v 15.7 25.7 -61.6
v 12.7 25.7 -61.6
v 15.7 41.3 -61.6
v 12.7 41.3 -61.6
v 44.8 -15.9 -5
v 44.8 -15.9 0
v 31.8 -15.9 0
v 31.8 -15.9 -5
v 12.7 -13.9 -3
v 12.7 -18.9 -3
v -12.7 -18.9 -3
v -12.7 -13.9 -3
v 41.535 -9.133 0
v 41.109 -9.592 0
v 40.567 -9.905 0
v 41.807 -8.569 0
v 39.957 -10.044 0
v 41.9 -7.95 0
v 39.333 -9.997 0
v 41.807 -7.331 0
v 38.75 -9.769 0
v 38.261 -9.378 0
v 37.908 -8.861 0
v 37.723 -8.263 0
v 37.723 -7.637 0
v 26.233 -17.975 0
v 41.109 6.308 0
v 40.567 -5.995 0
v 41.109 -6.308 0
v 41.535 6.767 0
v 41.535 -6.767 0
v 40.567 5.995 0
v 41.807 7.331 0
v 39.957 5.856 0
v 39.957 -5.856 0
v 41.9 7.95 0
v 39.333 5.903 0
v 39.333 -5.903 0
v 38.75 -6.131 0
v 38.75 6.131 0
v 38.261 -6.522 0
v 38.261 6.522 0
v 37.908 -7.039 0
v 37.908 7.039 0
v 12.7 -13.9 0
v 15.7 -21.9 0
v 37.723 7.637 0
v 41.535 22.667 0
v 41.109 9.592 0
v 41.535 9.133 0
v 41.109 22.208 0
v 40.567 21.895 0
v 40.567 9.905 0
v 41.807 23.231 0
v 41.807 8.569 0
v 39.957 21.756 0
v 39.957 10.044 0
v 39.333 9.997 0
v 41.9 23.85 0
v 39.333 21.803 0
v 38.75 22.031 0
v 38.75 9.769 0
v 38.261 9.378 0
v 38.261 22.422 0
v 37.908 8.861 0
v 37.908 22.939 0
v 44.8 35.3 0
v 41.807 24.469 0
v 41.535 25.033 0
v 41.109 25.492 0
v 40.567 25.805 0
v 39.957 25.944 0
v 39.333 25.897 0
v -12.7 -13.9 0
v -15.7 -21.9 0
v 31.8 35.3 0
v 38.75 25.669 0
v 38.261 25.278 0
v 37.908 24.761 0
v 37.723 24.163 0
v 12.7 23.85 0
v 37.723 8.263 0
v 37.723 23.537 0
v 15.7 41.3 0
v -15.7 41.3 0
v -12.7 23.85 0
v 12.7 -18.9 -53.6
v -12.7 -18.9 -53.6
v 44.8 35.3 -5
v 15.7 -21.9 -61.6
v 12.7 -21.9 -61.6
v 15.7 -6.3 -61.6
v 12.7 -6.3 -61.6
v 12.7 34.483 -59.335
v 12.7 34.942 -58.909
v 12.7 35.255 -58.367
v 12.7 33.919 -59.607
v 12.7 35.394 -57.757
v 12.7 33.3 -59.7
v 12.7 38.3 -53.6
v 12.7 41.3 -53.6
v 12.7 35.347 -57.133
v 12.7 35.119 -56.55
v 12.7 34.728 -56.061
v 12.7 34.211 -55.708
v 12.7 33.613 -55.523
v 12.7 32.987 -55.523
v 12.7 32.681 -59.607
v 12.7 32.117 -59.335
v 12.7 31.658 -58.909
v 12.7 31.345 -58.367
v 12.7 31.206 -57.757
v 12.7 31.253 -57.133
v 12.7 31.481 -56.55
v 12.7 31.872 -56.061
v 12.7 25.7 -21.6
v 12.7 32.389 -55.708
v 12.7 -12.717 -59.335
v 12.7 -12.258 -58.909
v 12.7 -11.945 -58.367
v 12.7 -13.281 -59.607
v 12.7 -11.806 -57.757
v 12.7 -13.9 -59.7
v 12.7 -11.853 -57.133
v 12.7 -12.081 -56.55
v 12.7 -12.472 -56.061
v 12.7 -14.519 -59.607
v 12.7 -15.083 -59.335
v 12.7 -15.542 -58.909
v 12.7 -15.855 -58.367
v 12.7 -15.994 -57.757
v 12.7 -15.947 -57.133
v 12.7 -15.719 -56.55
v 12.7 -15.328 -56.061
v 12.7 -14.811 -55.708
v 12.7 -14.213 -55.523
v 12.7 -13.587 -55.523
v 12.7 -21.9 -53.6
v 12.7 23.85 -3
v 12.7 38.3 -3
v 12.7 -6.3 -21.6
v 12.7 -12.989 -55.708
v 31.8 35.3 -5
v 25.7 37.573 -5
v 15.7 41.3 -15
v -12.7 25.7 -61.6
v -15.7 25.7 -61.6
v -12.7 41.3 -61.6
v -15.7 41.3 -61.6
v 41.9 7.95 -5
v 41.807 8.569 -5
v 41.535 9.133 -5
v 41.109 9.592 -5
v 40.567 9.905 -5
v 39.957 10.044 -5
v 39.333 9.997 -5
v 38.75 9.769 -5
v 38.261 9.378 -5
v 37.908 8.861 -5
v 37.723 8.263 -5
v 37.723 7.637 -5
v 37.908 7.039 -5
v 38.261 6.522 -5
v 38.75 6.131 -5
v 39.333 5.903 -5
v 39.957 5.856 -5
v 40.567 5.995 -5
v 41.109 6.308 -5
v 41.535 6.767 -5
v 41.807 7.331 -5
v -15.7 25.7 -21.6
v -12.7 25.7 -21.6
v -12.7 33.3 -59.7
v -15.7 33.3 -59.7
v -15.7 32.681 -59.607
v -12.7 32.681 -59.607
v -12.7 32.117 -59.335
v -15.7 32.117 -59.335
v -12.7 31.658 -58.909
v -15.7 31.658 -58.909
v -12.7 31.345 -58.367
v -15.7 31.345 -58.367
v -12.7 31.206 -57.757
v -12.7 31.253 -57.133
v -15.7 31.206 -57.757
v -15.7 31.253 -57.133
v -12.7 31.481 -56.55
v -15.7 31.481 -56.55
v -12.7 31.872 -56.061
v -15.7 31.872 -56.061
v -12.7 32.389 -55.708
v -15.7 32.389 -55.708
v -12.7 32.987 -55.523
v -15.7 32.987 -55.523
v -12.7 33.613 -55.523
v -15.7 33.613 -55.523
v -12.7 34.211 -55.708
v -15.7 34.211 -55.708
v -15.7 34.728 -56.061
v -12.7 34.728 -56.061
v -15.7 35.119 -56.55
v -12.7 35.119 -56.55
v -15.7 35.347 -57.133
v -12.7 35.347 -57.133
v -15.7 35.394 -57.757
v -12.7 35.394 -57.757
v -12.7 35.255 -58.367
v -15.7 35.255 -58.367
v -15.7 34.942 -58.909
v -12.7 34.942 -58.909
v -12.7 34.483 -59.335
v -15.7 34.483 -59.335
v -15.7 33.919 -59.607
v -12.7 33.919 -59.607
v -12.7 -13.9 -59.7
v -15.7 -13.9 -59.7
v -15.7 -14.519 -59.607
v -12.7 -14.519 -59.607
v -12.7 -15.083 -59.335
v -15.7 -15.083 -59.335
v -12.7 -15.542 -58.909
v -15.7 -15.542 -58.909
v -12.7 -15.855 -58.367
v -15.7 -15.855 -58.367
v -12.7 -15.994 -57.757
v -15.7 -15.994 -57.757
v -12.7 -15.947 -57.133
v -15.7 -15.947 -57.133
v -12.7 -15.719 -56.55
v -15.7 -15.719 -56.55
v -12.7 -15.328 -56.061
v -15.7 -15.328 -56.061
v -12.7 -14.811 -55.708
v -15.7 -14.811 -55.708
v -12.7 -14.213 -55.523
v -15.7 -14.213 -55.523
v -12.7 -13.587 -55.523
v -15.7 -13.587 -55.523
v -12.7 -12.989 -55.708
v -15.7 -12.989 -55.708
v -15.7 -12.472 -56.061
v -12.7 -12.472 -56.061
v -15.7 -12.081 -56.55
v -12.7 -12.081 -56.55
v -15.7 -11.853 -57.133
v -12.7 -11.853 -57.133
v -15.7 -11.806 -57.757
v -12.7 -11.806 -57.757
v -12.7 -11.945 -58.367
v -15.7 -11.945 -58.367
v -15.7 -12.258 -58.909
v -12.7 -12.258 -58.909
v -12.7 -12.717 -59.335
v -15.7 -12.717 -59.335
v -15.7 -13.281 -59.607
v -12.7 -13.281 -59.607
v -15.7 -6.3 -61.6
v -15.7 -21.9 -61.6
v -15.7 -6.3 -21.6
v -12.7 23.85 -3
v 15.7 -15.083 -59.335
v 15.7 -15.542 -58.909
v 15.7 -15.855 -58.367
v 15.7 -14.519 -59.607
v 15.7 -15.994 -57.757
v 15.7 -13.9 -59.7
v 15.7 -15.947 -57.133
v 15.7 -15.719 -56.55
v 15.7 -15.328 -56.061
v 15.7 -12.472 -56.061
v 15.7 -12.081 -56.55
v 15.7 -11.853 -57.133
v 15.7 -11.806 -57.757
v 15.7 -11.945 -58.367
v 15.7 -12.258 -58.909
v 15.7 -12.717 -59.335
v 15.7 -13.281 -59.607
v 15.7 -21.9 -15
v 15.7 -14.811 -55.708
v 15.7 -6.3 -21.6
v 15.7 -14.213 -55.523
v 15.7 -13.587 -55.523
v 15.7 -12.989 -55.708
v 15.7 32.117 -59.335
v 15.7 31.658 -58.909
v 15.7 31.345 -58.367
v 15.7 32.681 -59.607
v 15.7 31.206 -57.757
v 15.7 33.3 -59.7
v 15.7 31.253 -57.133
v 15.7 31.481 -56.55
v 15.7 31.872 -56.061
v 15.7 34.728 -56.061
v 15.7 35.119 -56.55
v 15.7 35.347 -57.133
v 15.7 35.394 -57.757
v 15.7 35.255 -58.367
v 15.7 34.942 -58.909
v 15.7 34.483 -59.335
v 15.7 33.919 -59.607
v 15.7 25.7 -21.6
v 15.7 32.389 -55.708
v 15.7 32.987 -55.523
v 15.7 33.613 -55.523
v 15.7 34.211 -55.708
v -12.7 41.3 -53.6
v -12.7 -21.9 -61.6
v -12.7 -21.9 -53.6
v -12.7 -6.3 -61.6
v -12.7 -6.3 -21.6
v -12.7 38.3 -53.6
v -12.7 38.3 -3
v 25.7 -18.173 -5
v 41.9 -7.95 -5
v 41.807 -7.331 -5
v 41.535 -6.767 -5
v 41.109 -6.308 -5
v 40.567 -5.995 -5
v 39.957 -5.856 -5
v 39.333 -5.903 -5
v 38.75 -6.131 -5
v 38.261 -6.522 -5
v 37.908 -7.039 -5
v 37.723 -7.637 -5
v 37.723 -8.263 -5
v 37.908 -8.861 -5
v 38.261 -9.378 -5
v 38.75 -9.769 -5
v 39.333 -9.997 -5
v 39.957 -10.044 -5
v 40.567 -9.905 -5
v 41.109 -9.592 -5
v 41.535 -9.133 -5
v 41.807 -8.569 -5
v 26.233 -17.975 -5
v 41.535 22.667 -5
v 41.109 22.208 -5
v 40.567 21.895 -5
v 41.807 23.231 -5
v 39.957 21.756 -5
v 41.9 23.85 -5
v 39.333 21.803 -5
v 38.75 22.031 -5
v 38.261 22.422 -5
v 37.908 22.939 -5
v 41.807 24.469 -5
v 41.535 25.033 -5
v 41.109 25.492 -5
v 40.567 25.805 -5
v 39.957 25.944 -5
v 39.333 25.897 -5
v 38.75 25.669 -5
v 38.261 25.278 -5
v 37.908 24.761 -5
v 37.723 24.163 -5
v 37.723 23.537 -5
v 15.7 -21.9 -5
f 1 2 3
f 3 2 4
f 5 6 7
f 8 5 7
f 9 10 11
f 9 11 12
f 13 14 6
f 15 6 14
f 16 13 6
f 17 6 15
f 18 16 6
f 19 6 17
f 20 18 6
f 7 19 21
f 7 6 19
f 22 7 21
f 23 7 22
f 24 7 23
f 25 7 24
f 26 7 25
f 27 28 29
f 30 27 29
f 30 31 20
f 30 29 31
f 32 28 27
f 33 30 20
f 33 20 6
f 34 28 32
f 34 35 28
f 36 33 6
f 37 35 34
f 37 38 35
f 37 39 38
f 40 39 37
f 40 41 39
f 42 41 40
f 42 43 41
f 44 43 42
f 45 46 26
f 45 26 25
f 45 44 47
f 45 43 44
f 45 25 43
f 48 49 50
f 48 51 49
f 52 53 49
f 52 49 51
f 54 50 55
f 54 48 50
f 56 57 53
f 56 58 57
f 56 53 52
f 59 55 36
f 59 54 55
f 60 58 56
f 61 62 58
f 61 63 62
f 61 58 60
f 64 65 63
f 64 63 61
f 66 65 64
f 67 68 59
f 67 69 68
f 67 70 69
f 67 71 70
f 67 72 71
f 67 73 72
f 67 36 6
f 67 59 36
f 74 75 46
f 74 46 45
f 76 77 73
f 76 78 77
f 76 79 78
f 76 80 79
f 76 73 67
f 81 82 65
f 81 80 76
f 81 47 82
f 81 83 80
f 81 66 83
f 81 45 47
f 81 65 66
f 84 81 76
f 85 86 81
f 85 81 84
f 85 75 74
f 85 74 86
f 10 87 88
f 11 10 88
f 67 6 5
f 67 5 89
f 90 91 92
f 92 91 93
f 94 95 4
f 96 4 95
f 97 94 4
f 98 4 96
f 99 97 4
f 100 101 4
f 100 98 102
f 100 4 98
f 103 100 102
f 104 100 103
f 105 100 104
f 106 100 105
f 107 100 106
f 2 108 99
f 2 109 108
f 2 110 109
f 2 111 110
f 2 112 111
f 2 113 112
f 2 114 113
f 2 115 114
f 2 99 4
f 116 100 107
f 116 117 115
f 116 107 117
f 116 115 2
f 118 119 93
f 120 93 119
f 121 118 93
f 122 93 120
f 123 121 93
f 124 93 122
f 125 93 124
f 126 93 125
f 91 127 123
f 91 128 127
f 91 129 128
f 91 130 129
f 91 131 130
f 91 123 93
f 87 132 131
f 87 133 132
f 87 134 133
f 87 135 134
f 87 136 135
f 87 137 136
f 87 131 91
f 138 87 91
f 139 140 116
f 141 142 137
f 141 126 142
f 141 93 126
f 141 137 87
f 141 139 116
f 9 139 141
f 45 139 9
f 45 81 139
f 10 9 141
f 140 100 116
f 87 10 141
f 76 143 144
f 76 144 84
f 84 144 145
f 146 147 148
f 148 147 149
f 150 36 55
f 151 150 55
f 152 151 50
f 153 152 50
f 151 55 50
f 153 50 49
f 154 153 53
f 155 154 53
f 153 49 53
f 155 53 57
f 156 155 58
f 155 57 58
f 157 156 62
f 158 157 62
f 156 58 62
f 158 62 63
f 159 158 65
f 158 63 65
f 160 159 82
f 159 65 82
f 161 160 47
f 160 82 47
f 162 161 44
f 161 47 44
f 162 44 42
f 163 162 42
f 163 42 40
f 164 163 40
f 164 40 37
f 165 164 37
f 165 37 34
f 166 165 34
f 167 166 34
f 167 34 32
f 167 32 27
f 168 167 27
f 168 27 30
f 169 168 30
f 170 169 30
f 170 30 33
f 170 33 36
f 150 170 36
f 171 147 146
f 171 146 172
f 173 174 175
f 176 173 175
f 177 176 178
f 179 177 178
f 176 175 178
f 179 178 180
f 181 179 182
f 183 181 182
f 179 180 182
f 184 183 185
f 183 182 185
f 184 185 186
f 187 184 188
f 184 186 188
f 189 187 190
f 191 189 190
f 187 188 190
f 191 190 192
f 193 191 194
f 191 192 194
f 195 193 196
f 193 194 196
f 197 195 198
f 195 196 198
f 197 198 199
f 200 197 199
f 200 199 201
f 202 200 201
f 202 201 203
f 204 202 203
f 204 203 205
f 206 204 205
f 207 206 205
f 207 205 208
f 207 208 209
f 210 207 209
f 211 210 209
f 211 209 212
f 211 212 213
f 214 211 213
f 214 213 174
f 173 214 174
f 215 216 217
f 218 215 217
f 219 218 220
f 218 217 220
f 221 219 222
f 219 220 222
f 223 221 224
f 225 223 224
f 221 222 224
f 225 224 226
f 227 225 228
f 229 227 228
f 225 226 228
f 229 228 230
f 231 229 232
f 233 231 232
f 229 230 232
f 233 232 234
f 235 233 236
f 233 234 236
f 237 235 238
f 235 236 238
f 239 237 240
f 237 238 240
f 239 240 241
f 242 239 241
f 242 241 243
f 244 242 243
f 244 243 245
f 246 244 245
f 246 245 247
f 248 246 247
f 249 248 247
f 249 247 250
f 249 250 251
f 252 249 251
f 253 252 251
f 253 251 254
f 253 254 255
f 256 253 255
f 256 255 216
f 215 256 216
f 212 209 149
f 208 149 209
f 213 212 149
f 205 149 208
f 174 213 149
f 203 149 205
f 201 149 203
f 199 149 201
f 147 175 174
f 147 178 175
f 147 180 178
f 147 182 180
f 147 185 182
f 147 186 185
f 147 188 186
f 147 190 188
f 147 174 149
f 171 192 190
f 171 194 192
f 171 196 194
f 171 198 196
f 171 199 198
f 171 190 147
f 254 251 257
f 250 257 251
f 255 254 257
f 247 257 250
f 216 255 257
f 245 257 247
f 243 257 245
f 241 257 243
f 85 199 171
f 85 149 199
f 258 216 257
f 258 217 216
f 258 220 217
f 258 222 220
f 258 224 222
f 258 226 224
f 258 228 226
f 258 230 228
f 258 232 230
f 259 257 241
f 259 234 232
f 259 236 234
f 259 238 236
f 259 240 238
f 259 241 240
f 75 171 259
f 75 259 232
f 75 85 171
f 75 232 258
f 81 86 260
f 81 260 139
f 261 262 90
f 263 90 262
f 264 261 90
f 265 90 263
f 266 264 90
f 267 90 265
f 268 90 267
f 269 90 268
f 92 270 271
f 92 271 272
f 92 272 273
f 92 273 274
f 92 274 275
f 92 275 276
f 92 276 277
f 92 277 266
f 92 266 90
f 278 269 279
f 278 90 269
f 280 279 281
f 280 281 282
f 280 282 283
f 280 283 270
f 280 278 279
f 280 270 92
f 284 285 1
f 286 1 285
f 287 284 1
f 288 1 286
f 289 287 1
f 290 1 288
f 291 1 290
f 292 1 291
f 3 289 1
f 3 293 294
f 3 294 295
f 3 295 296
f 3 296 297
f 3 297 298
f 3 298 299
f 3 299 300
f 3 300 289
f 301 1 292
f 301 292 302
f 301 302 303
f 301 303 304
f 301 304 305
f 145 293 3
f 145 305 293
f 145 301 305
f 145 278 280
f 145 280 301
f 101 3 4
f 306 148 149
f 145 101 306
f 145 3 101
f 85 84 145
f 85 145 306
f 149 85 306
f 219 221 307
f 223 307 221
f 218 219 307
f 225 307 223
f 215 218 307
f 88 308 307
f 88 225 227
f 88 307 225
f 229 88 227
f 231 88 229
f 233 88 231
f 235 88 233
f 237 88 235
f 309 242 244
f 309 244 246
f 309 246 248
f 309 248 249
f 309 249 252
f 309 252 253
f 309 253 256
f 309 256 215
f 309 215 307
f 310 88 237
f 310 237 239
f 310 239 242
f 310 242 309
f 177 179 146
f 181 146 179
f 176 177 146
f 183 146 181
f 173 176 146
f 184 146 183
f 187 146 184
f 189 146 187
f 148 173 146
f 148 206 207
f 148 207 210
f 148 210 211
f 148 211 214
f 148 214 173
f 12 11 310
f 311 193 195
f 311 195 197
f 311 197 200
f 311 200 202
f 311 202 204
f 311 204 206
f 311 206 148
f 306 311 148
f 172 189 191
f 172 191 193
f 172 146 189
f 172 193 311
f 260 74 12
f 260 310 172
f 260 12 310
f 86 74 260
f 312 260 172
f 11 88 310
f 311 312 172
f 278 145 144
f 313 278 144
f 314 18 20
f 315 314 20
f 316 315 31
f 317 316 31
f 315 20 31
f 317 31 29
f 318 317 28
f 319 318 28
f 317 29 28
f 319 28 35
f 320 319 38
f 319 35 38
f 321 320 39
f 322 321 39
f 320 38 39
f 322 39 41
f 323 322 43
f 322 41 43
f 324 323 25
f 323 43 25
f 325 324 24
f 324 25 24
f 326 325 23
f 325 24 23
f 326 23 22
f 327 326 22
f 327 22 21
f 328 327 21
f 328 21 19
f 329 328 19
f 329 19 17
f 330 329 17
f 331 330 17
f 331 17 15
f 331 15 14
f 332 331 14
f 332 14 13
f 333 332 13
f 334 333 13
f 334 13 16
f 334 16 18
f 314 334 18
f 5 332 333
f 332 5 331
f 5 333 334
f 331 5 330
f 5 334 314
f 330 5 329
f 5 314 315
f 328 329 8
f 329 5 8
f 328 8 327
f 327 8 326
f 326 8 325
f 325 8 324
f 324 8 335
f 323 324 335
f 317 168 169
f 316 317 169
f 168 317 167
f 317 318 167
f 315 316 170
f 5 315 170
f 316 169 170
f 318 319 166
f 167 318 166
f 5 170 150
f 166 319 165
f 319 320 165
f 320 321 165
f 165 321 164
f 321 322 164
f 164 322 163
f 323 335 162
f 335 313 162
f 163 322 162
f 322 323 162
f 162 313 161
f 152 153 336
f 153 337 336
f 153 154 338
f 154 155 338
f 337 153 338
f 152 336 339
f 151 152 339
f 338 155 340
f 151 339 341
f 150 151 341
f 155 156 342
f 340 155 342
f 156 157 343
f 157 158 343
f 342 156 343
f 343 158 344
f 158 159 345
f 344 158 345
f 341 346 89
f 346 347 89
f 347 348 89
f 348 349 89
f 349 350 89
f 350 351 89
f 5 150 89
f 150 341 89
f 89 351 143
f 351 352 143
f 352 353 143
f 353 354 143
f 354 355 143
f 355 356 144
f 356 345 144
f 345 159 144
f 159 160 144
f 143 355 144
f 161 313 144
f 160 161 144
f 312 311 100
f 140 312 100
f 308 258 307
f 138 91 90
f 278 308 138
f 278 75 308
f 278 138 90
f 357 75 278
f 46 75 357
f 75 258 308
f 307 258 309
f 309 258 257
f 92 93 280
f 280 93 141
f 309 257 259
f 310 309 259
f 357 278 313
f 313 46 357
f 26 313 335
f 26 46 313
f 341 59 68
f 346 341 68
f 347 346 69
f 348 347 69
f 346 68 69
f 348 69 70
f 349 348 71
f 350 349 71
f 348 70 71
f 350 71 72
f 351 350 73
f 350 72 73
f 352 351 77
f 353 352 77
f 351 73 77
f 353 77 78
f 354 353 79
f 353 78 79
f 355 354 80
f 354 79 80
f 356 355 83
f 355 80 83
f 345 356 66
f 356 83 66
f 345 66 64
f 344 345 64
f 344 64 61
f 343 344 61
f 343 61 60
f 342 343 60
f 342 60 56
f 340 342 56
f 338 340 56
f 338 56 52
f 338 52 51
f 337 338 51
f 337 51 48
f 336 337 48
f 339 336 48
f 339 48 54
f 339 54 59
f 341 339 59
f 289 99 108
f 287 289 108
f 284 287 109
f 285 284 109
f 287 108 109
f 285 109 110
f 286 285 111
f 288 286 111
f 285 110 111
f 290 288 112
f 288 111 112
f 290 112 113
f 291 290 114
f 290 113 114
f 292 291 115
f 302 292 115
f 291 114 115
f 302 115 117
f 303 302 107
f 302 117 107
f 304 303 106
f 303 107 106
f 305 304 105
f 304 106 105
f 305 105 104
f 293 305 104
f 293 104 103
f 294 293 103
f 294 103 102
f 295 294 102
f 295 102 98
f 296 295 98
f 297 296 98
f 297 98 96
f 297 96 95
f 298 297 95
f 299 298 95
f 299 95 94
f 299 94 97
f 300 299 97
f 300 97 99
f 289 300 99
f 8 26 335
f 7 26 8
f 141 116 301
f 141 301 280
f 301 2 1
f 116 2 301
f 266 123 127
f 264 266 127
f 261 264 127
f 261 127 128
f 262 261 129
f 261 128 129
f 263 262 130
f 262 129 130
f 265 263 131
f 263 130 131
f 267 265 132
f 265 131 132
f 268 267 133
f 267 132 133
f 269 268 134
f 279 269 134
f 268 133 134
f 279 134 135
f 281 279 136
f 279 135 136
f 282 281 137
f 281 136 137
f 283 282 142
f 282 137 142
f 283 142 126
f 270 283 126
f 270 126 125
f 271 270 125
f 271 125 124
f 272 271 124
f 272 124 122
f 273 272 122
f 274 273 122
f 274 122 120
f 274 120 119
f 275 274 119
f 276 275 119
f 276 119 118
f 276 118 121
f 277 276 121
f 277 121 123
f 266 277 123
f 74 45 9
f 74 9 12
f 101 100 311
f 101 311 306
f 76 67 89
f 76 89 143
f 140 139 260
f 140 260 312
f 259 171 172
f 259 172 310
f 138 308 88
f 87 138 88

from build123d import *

# Parameters (mm, degrees)
SKETCH1_W           = 51.2
SKETCH1_H           = 13
SKETCH1_R           = 2.1
SKETCH1_W_2         = 5
SKETCH1_H_2         = 25.4
BOSS_EXTRUDE1_DEPTH = 3
BOSS_EXTRUDE2_DEPTH = 61.6
SKETCH2_R           = 2.1
SKETCH2_W           = 32
SKETCH2_H           = 40
CUT_EXTRUDE1_DEPTH  = 100
SKETCH3_W           = 63.2
SKETCH3_H           = 25.4
CUT_EXTRUDE2_DEPTH  = 8
SKETCH1_5_W         = 51.2
SKETCH1_5_H         = 13
SKETCH1_5_R         = 2.1
BOSS_EXTRUDE3_DEPTH = 5
CHAMFER1_SIZE       = 10


with BuildPart() as part:
    # Sketch1 → Boss-Extrude1 (new body)
    # profile 1 of 9: a face of its own
    with BuildSketch(Plane(origin=(0, 0, 0), x_dir=(0, 1, 0), z_dir=(0, 0, 1))):
        with BuildLine():
            Line((41.3, -15.7), (27.654113618, -15.7))
            ThreePointArc((27.654113618, -15.7), (15.999687497, -27.481812167), (0, -31.8))
            Line((0, -31.8), (35.3, -31.8))
            Line((35.3, -31.8), (41.3, -15.7))
        make_face()
    # profile 2 of 9: a face of its own
    with BuildSketch(Plane(origin=(0, 0, 0), x_dir=(0, 1, 0), z_dir=(0, 0, 1))):
        with BuildLine():
            Line((27.654113618, -15.7), (-21.9, -15.7))
            Line((-21.9, -15.7), (-17.974836126, -26.232523063))
            ThreePointArc((-17.974836126, -26.232523063), (-9.408660016, -30.376259097), (0, -31.8))
            ThreePointArc((0, -31.8), (15.999687497, -27.481812167), (27.654113618, -15.7))
        make_face()
    # profile 3 of 9: a face of its own
    with BuildSketch(Plane(origin=(0, 0, 0), x_dir=(0, 1, 0), z_dir=(0, 0, 1))):
        with BuildLine():
            ThreePointArc((0, -31.8), (-9.408660016, -30.376259097), (-17.974836126, -26.232523063))
            Line((-17.974836126, -26.232523063), (-15.9, -31.8))
            Line((-15.9, -31.8), (0, -31.8))
        make_face()
    # profile 4 of 9: a face of its own
    with BuildSketch(Plane(origin=(0, 0, 0), x_dir=(0, 1, 0), z_dir=(0, 0, 1))):
        with Locations((9.7, -38.3)):
            Rectangle(SKETCH1_W, SKETCH1_H)
        with Locations(Location((23.85, -39.8, 0), (0, 0, 270))):
            Circle(SKETCH1_R, mode=Mode.SUBTRACT)
        with Locations(Location((7.95, -39.8, 0), (0, 0, 270))):
            Circle(SKETCH1_R, mode=Mode.SUBTRACT)
        with Locations(Location((-7.95, -39.8, 0), (0, 0, 270))):
            Circle(SKETCH1_R, mode=Mode.SUBTRACT)
    # profile 5 of 9: a face of its own
    with BuildSketch(Plane(origin=(0, 0, 0), x_dir=(0, 1, 0), z_dir=(0, 0, 1))):
        with BuildLine():
            ThreePointArc((29.153901969, -12.7), (28.443587304, -14.219786963), (27.654113618, -15.7))
            Line((27.654113618, -15.7), (41.3, -15.7))
            Line((41.3, -15.7), (41.3, 15.7))
            Line((41.3, 15.7), (27.654113618, 15.7))
            ThreePointArc((27.654113618, 15.7), (28.443587304, 14.219786963), (29.153901969, 12.7))
            Line((29.153901969, 12.7), (38.3, 12.7))
            Line((38.3, 12.7), (38.3, -12.7))
            Line((38.3, -12.7), (29.153901969, -12.7))
        make_face()
    # profile 6 of 9: a face of its own
    with BuildSketch(Plane(origin=(0, 0, 0), x_dir=(0, 1, 0), z_dir=(0, 0, 1))):
        with BuildLine():
            Line((-21.9, 15.7), (-21.9, -15.7))
            Line((-21.9, -15.7), (27.654113618, -15.7))
            ThreePointArc((27.654113618, -15.7), (28.443587304, -14.219786963), (29.153901969, -12.7))
            Line((29.153901969, -12.7), (23.85, -12.7))
            Line((23.85, -12.7), (-13.9, -12.7))
            Line((-13.9, -12.7), (-18.9, -12.7))
            Line((-18.9, -12.7), (-18.9, 12.7))
            Line((-18.9, 12.7), (-13.9, 12.7))
            Line((-13.9, 12.7), (23.85, 12.7))
            Line((23.85, 12.7), (29.153901969, 12.7))
            ThreePointArc((29.153901969, 12.7), (28.443587304, 14.219786963), (27.654113618, 15.7))
            Line((27.654113618, 15.7), (-21.9, 15.7))
        make_face()
    # profile 7 of 9: a face of its own
    with BuildSketch(Plane(origin=(0, 0, 0), x_dir=(0, 1, 0), z_dir=(0, 0, 1))):
        with BuildLine():
            Line((23.85, -12.7), (29.153901969, -12.7))
            ThreePointArc((29.153901969, -12.7), (31.131447787, -6.486367142), (31.8, 0))
            ThreePointArc((31.8, 0), (31.131447787, 6.486367142), (29.153901969, 12.7))
            Line((29.153901969, 12.7), (23.85, 12.7))
            Line((23.85, 12.7), (23.85, -12.7))
        make_face()
    # profile 8 of 9: a face of its own
    with BuildSketch(Plane(origin=(0, 0, 0), x_dir=(0, 1, 0), z_dir=(0, 0, 1))):
        with BuildLine():
            ThreePointArc((31.8, 0), (31.131447787, -6.486367142), (29.153901969, -12.7))
            Line((29.153901969, -12.7), (38.3, -12.7))
            Line((38.3, -12.7), (38.3, 12.7))
            Line((38.3, 12.7), (29.153901969, 12.7))
            ThreePointArc((29.153901969, 12.7), (31.131447787, 6.486367142), (31.8, 0))
        make_face()
    # profile 9 of 9: a face of its own
    with BuildSketch(Plane(origin=(0, 0, 0), x_dir=(0, 1, 0), z_dir=(0, 0, 1))):
        with Locations((-16.4, 0)):
            Rectangle(SKETCH1_W_2, SKETCH1_H_2)
    extrude(amount=-BOSS_EXTRUDE1_DEPTH)

    # Sketch1<4> → Boss-Extrude2 (add)
    with BuildSketch(Plane(origin=(0, 0, 0), x_dir=(0, 1, 0), z_dir=(0, 0, 1))):
        with BuildLine():
            ThreePointArc((29.153901969, -12.7), (28.443587304, -14.219786963), (27.654113618, -15.7))
            Line((27.654113618, -15.7), (41.3, -15.7))
            Line((41.3, -15.7), (41.3, 15.7))
            Line((41.3, 15.7), (27.654113618, 15.7))
            ThreePointArc((27.654113618, 15.7), (28.443587304, 14.219786963), (29.153901969, 12.7))
            Line((29.153901969, 12.7), (38.3, 12.7))
            Line((38.3, 12.7), (38.3, -12.7))
            Line((38.3, -12.7), (29.153901969, -12.7))
        make_face()
        with BuildLine():
            Line((-21.9, 15.7), (-21.9, -15.7))
            Line((-21.9, -15.7), (27.654113618, -15.7))
            ThreePointArc((27.654113618, -15.7), (28.443587304, -14.219786963), (29.153901969, -12.7))
            Line((29.153901969, -12.7), (23.85, -12.7))
            Line((23.85, -12.7), (-13.9, -12.7))
            Line((-13.9, -12.7), (-18.9, -12.7))
            Line((-18.9, -12.7), (-18.9, 12.7))
            Line((-18.9, 12.7), (-13.9, 12.7))
            Line((-13.9, 12.7), (23.85, 12.7))
            Line((23.85, 12.7), (29.153901969, 12.7))
            ThreePointArc((29.153901969, 12.7), (28.443587304, 14.219786963), (27.654113618, 15.7))
            Line((27.654113618, 15.7), (-21.9, 15.7))
        make_face()
    extrude(amount=-BOSS_EXTRUDE2_DEPTH)

    # Sketch2 → Cut-Extrude1 (cut)
    with BuildSketch(Plane(origin=(-15.7, 0, 0), x_dir=(0, -1, 0), z_dir=(-1, 0, 0))):
        with Locations(Location((13.9, -57.6, 0), (0, 0, 270))):
            Circle(SKETCH2_R)
        with Locations(Location((-33.3, -57.6, 0), (0, 0, 270))):
            Circle(SKETCH2_R)
        with Locations((-9.7, -41.6)):
            Rectangle(SKETCH2_W, SKETCH2_H)
    extrude(amount=-CUT_EXTRUDE1_DEPTH, mode=Mode.SUBTRACT)

    # Sketch3 → Cut-Extrude2 (cut)
    with BuildSketch(Plane.YX.offset(61.6)):
        with Locations((9.7, 0)):
            Rectangle(SKETCH3_W, SKETCH3_H)
    extrude(amount=-CUT_EXTRUDE2_DEPTH, mode=Mode.SUBTRACT)

    # Sketch1<5> → Boss-Extrude3 (add)
    # profile 1 of 4: a face of its own
    with BuildSketch(Plane(origin=(0, 0, 0), x_dir=(0, 1, 0), z_dir=(0, 0, 1))):
        with BuildLine():
            Line((27.654113618, -15.7), (-21.9, -15.7))
            Line((-21.9, -15.7), (-17.974836126, -26.232523063))
            ThreePointArc((-17.974836126, -26.232523063), (-9.408660016, -30.376259097), (0, -31.8))
            ThreePointArc((0, -31.8), (15.999687497, -27.481812167), (27.654113618, -15.7))
        make_face()
    # profile 2 of 4: a face of its own
    with BuildSketch(Plane(origin=(0, 0, 0), x_dir=(0, 1, 0), z_dir=(0, 0, 1))):
        with BuildLine():
            Line((41.3, -15.7), (27.654113618, -15.7))
            ThreePointArc((27.654113618, -15.7), (15.999687497, -27.481812167), (0, -31.8))
            Line((0, -31.8), (35.3, -31.8))
            Line((35.3, -31.8), (41.3, -15.7))
        make_face()
    # profile 3 of 4: a face of its own
    with BuildSketch(Plane(origin=(0, 0, 0), x_dir=(0, 1, 0), z_dir=(0, 0, 1))):
        with BuildLine():
            ThreePointArc((0, -31.8), (-9.408660016, -30.376259097), (-17.974836126, -26.232523063))
            Line((-17.974836126, -26.232523063), (-15.9, -31.8))
            Line((-15.9, -31.8), (0, -31.8))
        make_face()
    # profile 4 of 4: a face of its own
    with BuildSketch(Plane(origin=(0, 0, 0), x_dir=(0, 1, 0), z_dir=(0, 0, 1))):
        with Locations((9.7, -38.3)):
            Rectangle(SKETCH1_5_W, SKETCH1_5_H)
        with Locations(Location((23.85, -39.8, 0), (0, 0, 270))):
            Circle(SKETCH1_5_R, mode=Mode.SUBTRACT)
        with Locations(Location((7.95, -39.8, 0), (0, 0, 270))):
            Circle(SKETCH1_5_R, mode=Mode.SUBTRACT)
        with Locations(Location((-7.95, -39.8, 0), (0, 0, 270))):
            Circle(SKETCH1_5_R, mode=Mode.SUBTRACT)
    extrude(amount=-BOSS_EXTRUDE3_DEPTH)

    # Chamfer1
    # the kernel refuses this chamfer: 10 mm, written as the material it adds along each edge
    with BuildSketch(Plane(origin=(15.7, -21.9, -5), x_dir=(-0.027495876610586317, 0, -0.9996219169112968), z_dir=(0, 1, 0))) as chamfer1_piece_1_section:
        Polygon((CHAMFER1_SIZE * 0.999621916911, -CHAMFER1_SIZE * 0.0274958766106), (-CHAMFER1_SIZE * 0.0274958766106, -CHAMFER1_SIZE * 0.999621916911), (0, 0), align=None)
    chamfer1_piece_1 = extrude(amount=63.2, mode=Mode.PRIVATE)
    chamfer1_piece_1 = split(chamfer1_piece_1, bisect_by=Plane(origin=(28.867881951, -16.992714801, -8.339298449), z_dir=(-0.34920923314434543, 0.9370447756039934, 0)), keep=Keep.TOP, mode=Mode.PRIVATE)
    chamfer1_piece_1 = split(chamfer1_piece_1, bisect_by=Plane(origin=(28.867881951, 36.392714801, -8.339298449), z_dir=(-0.3492092331443461, -0.9370447756039931, 0)), keep=Keep.TOP, mode=Mode.PRIVATE)
    add(chamfer1_piece_1)


solid = part.part
